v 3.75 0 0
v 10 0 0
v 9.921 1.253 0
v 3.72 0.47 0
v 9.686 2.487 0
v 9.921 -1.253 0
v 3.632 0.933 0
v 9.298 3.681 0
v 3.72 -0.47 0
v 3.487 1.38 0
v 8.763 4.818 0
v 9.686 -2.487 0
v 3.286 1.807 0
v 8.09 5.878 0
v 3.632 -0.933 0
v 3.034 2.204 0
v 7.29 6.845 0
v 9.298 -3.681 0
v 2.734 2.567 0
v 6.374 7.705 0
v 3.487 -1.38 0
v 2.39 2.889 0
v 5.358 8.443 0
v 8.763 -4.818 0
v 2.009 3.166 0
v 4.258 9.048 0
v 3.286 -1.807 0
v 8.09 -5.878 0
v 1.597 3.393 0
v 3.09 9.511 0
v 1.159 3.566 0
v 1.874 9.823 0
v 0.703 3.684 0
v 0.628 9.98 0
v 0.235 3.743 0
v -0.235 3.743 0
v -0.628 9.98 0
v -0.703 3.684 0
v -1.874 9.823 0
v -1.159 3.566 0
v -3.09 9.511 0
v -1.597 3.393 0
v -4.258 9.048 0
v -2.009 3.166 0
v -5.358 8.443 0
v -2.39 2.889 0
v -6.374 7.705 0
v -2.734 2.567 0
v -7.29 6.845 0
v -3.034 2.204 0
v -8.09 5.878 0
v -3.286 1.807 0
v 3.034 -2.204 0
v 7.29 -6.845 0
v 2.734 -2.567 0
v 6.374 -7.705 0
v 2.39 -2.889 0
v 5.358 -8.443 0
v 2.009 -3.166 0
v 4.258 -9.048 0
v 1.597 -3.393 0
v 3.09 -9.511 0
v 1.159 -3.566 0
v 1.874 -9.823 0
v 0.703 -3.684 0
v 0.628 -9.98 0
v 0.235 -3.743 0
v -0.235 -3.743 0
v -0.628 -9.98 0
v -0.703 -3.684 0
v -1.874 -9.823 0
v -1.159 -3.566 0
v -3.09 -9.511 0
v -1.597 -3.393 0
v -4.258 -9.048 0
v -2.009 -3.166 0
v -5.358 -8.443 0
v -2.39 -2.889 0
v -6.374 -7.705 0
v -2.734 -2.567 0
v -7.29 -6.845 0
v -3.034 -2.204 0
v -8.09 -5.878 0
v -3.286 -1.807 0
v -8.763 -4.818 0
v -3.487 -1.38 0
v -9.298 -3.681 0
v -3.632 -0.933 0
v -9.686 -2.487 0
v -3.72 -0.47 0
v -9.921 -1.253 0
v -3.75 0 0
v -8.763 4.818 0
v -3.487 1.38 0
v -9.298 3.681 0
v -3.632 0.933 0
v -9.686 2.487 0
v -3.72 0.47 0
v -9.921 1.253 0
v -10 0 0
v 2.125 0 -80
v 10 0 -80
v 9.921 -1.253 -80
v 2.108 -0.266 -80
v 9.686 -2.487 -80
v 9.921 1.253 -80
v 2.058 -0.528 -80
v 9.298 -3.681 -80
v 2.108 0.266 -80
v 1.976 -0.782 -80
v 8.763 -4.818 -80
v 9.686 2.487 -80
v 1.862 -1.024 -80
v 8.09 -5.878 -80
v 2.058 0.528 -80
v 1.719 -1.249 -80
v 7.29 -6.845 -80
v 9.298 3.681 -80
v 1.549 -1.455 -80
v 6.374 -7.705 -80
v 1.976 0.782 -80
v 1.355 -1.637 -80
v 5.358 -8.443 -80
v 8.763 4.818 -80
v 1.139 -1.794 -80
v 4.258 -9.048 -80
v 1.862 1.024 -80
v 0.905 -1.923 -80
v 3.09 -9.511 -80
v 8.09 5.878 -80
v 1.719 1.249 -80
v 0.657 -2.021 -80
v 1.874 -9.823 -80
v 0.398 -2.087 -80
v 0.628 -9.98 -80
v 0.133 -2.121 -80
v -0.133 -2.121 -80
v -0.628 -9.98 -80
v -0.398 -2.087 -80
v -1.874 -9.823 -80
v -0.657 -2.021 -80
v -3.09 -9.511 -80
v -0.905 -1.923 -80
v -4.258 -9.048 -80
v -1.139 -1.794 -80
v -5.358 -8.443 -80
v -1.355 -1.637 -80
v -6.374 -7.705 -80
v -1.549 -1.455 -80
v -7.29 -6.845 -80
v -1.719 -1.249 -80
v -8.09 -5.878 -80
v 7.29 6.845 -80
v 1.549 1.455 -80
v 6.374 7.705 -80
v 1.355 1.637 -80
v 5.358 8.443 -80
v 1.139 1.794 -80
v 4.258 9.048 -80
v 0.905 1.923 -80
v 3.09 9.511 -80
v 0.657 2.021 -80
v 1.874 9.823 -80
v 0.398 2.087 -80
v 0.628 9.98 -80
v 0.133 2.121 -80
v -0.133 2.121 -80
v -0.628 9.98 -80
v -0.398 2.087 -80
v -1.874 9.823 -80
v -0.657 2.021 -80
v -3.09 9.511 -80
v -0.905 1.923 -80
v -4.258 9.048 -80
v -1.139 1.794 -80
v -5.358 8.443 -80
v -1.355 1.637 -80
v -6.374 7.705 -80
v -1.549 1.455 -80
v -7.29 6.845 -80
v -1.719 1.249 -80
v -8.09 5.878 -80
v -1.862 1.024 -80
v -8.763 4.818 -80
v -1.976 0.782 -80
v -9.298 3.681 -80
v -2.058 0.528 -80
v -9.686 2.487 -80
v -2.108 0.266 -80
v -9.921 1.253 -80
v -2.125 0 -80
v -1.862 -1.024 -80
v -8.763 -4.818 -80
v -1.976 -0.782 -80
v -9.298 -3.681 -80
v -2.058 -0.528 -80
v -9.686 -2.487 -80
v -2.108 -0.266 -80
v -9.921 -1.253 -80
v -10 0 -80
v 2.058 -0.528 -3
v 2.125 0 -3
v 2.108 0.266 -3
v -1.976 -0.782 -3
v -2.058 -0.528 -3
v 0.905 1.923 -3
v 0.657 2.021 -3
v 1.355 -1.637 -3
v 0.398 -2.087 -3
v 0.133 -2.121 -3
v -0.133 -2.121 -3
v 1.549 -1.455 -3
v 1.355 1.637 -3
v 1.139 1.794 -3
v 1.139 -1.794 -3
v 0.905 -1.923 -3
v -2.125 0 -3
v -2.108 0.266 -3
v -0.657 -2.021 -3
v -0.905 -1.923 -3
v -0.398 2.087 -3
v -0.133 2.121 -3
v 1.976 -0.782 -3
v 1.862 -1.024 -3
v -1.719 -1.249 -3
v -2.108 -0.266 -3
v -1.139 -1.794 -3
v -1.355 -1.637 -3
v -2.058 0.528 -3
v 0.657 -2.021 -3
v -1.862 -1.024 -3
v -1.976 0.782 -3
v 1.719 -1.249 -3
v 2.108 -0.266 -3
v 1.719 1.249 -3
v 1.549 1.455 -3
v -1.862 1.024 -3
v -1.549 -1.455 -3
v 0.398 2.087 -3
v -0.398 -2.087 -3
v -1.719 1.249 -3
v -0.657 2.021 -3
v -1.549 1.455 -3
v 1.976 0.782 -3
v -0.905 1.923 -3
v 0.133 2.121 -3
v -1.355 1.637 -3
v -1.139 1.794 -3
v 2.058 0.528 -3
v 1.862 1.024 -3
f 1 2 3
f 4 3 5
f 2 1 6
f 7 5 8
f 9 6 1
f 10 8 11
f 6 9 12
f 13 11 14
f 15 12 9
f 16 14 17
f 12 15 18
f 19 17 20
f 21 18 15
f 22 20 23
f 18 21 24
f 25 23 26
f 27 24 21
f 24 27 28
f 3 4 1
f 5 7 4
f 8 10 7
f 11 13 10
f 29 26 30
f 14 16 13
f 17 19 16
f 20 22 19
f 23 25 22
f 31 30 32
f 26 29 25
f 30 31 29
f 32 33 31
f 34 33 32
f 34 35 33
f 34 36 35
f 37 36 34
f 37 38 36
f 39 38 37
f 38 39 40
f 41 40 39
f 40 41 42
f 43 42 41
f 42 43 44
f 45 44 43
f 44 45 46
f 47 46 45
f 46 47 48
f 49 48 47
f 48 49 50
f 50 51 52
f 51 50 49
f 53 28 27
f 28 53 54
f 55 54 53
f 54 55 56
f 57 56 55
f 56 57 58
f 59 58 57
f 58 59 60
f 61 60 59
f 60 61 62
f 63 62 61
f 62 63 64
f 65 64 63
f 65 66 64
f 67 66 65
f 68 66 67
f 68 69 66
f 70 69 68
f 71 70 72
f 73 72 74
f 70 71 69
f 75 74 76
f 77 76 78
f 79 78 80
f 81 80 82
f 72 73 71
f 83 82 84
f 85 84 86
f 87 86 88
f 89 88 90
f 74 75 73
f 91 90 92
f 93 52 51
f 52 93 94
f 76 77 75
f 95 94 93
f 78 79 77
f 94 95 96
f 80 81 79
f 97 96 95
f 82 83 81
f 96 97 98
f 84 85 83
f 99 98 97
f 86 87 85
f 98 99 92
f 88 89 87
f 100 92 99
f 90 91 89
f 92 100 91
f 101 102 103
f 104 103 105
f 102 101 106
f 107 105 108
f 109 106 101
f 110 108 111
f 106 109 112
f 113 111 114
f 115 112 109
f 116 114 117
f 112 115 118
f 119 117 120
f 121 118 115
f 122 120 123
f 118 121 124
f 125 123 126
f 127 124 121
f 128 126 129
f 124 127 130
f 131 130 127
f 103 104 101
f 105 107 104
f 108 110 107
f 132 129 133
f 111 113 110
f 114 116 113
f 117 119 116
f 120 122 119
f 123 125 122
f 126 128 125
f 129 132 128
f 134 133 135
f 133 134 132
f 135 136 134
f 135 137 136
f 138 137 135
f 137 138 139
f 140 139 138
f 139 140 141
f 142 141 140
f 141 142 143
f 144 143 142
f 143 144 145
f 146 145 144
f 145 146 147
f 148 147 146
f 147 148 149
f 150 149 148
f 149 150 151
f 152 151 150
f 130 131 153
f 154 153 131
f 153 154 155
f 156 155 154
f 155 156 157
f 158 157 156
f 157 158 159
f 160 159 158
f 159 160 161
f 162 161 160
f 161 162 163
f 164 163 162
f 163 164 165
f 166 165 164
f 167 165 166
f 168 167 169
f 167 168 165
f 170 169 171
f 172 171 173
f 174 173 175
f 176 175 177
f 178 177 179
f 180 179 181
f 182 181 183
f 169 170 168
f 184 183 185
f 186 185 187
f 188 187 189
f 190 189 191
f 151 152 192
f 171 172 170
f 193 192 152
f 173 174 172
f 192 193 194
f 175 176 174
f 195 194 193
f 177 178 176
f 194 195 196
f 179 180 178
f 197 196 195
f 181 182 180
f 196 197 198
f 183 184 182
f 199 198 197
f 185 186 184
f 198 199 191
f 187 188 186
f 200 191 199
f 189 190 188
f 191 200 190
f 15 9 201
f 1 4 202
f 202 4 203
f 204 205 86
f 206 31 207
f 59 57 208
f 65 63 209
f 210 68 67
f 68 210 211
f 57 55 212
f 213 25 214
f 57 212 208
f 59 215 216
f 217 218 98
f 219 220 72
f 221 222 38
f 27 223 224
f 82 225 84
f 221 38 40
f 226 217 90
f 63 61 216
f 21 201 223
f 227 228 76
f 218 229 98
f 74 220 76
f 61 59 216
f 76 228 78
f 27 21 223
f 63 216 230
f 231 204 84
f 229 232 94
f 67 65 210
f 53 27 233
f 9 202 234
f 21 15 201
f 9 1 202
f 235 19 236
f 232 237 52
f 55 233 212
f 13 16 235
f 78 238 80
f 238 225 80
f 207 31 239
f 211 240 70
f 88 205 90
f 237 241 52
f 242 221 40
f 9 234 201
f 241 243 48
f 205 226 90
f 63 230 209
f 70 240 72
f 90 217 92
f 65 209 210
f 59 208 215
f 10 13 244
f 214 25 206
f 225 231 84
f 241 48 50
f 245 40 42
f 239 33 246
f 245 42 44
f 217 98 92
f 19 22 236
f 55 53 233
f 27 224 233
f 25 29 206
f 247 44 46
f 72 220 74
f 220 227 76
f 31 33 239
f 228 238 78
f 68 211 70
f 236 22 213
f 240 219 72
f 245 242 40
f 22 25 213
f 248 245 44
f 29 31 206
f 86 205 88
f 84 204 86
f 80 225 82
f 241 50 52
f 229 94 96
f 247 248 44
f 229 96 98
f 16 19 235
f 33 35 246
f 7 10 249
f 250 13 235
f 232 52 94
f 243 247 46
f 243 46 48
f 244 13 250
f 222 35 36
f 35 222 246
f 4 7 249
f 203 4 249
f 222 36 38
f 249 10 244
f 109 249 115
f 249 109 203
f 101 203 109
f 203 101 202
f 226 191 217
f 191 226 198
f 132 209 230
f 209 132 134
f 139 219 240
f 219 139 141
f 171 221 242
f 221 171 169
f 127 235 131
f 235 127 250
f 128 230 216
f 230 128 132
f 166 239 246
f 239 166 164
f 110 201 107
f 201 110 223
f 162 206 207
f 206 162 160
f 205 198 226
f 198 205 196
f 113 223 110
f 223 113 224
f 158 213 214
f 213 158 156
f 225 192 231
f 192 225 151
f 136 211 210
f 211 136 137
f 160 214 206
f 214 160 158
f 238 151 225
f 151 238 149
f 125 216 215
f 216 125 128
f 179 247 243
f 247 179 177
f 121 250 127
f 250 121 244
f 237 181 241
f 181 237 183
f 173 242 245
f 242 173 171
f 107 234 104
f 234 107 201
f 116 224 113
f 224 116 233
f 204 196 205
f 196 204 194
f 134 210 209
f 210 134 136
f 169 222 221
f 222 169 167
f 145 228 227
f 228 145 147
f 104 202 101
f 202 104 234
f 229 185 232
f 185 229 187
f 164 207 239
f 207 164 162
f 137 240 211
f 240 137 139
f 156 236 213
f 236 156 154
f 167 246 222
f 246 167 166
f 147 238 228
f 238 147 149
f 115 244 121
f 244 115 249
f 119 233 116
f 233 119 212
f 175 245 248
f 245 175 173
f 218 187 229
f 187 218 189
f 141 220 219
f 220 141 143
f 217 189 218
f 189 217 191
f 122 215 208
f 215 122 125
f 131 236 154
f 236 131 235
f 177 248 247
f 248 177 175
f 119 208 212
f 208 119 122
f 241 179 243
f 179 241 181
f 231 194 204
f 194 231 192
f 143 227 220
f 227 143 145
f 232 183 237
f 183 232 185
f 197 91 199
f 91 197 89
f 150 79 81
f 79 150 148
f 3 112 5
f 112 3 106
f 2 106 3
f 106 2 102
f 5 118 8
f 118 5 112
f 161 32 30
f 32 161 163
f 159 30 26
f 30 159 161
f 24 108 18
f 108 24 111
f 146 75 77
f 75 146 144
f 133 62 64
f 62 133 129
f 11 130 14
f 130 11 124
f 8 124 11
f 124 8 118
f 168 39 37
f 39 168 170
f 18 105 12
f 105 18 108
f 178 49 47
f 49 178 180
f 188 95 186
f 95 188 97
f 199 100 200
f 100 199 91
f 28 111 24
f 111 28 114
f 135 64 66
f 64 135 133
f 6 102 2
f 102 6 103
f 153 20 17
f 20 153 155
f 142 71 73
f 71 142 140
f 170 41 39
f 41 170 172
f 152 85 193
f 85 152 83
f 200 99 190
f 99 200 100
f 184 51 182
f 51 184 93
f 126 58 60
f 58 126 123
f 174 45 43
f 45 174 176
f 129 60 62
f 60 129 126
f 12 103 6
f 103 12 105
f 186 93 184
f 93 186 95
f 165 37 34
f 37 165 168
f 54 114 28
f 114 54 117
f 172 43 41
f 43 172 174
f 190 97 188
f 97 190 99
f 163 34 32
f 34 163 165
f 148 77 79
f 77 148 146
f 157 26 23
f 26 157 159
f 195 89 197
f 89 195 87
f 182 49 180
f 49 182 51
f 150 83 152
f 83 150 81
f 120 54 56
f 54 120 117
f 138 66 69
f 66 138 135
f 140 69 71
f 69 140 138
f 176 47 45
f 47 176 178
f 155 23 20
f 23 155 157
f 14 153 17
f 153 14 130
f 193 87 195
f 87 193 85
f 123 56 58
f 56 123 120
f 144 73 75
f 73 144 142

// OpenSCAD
$fn = 50;


difference() {
	union() {
		translate(v = [0, 0, -80.0000000000]) {
			cylinder(h = 80, r = 10.0000000000);
		}
		cylinder(h = 0, r = 20.0000000000);
	}
	union() {
		translate(v = [0, 0, 0]) {
			rotate(a = [0, 0, 0]) {
				difference() {
					union() {
						#translate(v = [0, 0, -80.0000000000]) {
							cylinder(h = 80, r = 2.0000000000);
						}
						#translate(v = [0, 0, -3]) {
							cylinder(h = 3, r1 = 2.1250000000, r2 = 3.7500000000);
						}
						#translate(v = [0, 0, -80.0000000000]) {
							cylinder(h = 80, r = 2.1250000000);
						}
						#translate(v = [0, 0, -80.0000000000]) {
							cylinder(h = 80, r = 2.0000000000);
						}
					}
					union();
				}
			}
		}
	}
}
